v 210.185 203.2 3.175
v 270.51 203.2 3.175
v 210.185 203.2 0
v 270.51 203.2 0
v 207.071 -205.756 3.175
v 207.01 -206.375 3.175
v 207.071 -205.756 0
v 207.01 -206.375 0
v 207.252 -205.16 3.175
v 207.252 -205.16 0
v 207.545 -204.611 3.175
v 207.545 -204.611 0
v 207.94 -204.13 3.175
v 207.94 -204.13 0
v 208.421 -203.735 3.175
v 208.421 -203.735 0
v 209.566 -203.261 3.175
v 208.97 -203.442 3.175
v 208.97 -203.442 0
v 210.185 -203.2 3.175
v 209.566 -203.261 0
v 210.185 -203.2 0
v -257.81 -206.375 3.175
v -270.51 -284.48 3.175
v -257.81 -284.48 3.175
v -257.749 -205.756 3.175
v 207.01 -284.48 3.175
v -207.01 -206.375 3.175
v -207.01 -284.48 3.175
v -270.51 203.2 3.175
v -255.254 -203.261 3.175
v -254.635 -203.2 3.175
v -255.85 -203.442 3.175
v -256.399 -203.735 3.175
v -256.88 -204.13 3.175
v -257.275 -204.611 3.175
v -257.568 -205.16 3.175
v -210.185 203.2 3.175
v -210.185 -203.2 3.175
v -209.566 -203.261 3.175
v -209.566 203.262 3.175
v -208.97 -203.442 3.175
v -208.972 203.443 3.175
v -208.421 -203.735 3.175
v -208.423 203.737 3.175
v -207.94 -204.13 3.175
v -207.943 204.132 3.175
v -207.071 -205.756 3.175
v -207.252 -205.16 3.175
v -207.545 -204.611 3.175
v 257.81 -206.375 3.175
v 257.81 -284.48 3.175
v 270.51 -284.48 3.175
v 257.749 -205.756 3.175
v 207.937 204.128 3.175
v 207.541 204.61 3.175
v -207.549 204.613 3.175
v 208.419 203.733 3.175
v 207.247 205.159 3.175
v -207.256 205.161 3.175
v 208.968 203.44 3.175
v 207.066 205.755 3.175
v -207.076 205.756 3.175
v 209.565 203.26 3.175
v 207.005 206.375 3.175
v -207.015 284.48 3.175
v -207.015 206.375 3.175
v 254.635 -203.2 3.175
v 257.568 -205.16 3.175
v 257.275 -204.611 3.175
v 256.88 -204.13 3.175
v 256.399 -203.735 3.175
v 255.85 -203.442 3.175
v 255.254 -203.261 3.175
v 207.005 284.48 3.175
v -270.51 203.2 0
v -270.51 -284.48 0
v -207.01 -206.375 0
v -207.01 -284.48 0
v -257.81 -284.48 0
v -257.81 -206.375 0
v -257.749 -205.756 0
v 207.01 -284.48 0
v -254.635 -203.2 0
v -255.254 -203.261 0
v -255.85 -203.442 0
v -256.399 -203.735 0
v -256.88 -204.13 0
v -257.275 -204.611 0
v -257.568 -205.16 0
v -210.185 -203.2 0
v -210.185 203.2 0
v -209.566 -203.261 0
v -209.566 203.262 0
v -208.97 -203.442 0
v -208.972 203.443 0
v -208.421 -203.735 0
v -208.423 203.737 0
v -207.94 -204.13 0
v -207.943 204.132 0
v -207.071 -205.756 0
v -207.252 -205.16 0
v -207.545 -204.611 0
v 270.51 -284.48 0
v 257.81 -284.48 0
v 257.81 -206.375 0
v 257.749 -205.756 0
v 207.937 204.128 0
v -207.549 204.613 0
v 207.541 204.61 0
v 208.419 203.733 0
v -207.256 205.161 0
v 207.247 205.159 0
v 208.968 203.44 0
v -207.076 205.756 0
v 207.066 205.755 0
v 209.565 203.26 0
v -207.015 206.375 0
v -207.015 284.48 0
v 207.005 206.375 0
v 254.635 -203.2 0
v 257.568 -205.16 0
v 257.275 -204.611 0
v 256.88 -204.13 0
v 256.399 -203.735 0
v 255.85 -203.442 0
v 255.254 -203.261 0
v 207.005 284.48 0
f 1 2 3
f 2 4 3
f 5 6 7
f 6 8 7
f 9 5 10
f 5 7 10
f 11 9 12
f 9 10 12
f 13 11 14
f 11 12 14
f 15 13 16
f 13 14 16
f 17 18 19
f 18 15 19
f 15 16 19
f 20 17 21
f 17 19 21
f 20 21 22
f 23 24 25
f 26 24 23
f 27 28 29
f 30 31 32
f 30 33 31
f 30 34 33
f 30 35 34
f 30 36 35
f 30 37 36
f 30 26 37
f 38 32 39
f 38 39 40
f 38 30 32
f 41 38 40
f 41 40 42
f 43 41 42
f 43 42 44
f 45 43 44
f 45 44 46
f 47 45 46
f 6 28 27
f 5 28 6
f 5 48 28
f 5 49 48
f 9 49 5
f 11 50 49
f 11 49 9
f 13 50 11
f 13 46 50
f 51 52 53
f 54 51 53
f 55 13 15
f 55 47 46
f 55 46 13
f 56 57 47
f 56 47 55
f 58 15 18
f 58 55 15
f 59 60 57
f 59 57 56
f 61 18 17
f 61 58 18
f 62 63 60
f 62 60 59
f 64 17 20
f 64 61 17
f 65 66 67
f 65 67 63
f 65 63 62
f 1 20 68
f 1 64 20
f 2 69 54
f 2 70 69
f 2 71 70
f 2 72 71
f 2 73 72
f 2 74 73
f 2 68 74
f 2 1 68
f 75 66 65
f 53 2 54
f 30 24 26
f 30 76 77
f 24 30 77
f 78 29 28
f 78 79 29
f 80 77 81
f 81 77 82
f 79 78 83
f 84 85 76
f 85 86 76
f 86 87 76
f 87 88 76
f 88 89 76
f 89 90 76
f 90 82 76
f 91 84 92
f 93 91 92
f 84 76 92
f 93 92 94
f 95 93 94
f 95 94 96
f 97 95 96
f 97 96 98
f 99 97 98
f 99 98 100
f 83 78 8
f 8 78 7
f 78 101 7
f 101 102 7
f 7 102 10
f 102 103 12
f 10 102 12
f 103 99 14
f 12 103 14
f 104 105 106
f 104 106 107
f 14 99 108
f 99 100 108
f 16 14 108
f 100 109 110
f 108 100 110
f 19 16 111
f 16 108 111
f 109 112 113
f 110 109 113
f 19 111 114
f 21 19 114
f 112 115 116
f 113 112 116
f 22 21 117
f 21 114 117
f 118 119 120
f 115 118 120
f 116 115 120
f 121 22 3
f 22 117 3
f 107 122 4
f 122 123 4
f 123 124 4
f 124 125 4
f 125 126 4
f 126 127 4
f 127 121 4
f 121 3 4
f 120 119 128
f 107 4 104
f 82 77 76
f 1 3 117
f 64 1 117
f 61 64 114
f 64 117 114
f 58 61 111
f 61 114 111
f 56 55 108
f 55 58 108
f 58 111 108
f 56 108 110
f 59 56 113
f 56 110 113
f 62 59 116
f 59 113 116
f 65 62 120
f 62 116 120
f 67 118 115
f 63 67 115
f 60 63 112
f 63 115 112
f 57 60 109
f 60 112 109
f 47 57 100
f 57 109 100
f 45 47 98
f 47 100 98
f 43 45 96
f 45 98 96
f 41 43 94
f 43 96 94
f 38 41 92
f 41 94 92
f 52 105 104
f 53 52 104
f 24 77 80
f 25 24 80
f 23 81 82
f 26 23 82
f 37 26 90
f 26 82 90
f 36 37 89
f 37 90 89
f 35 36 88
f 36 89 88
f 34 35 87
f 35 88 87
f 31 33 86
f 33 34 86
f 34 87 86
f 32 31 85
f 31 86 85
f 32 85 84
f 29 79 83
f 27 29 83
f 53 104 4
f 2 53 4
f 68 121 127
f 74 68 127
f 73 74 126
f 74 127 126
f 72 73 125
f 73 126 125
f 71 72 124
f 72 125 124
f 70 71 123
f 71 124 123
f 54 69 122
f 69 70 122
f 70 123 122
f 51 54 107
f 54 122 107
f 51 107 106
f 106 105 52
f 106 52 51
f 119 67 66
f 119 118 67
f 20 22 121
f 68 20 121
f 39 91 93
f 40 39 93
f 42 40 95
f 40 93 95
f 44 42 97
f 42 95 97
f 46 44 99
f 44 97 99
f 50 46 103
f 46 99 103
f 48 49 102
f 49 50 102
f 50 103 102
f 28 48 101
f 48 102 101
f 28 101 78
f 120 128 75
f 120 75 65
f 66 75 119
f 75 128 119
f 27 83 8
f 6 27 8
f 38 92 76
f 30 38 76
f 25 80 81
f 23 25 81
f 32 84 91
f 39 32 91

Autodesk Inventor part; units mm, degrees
ref_plane "YZ Plane" through (0, 0, 0) normal (1, 0, 0) x (0, 1, 0)
ref_plane "XZ Plane" through (0, 0, 0) normal (0, 1, 0) x (-1, 0, 0)
ref_plane "XY Plane" through (0, 0, 0) normal (0, 0, 1) x (1, 0, 0)
sketch "Sketch1" plane through (0, 0, 0) normal (0, 0, 1) x (1, 0, 0)
  line L0 (270.51, 284.48) -> (-270.51, -284.48) construction
  line L1 (-270.51, 284.48) -> (270.51, -284.48) construction
  line L2 (-270.51, -284.48) -> (-257.81, -284.48)
  line L3 (-207.01, -284.48) -> (207.01, -284.48)
  line L4 (257.81, -284.48) -> (270.51, -284.48)
  line L5 (270.51, -284.48) -> (270.51, 203.2)
  line L6 (207.005, 284.48) -> (-207.015, 284.48)
  line L7 (-207.015, 206.375) -> (-207.015, 284.48)
  line L8 (-210.185, 203.2) -> (-270.51, 203.2)
  line L9 (-270.51, 203.2) -> (-270.51, -284.48)
  arc A0 (-210.185, 203.2) -> (-207.015, 206.375) centre (-210.19, 206.375) ccw
  line L10 (207.005, 284.48) -> (207.005, 206.375)
  line L11 (270.51, 203.2) -> (210.185, 203.2)
  arc A1 (207.005, 206.375) -> (210.185, 203.2) centre (210.18, 206.375) ccw
  line L12 (-257.81, -284.48) -> (-257.81, -206.375)
  line L13 (-207.01, -284.48) -> (-207.01, -206.375)
  arc A2 (-254.635, -203.2) -> (-257.81, -206.375) centre (-254.635, -206.375) ccw
  arc A3 (-207.01, -206.375) -> (-210.185, -203.2) centre (-210.185, -206.375) ccw
  line L14 (-254.635, -203.2) -> (-210.185, -203.2)
  line L15 (207.01, -284.48) -> (207.01, -206.375)
  line L16 (257.81, -284.48) -> (257.81, -206.375)
  arc A4 (210.185, -203.2) -> (207.01, -206.375) centre (210.185, -206.375) ccw
  arc A5 (257.81, -206.375) -> (254.635, -203.2) centre (254.635, -206.375) ccw
  line L17 (210.185, -203.2) -> (254.635, -203.2)
  point P0 (0, 0)
  point P1 (0, 0)
  dimension "d0" = 541.02
  dimension "d1" = 568.96
  dimension "d2" = 12.7
  dimension "d6" = 414.02
  dimension "d10" = 12.7
  dimension "d11" = 487.68
  dimension "d14" = 414.02
  dimension "d19" = 78.105
  dimension "d20" = 60.325
  dimension "d22" = 78.105
  dimension "d23" = 60.325
  dimension "d26" = 78.105
  dimension "d27" = 78.105
  dimension "d28" = 44.45
  dimension "d29" = 50.8
  dimension "d30" = 78.105
  dimension "d31" = 78.105
extrude "Extrusion1" add sketch "Sketch1" along normal blind 3.175
properties part number "BK-BKT120-BasePlateextruded" material "Aluminum 6061"
